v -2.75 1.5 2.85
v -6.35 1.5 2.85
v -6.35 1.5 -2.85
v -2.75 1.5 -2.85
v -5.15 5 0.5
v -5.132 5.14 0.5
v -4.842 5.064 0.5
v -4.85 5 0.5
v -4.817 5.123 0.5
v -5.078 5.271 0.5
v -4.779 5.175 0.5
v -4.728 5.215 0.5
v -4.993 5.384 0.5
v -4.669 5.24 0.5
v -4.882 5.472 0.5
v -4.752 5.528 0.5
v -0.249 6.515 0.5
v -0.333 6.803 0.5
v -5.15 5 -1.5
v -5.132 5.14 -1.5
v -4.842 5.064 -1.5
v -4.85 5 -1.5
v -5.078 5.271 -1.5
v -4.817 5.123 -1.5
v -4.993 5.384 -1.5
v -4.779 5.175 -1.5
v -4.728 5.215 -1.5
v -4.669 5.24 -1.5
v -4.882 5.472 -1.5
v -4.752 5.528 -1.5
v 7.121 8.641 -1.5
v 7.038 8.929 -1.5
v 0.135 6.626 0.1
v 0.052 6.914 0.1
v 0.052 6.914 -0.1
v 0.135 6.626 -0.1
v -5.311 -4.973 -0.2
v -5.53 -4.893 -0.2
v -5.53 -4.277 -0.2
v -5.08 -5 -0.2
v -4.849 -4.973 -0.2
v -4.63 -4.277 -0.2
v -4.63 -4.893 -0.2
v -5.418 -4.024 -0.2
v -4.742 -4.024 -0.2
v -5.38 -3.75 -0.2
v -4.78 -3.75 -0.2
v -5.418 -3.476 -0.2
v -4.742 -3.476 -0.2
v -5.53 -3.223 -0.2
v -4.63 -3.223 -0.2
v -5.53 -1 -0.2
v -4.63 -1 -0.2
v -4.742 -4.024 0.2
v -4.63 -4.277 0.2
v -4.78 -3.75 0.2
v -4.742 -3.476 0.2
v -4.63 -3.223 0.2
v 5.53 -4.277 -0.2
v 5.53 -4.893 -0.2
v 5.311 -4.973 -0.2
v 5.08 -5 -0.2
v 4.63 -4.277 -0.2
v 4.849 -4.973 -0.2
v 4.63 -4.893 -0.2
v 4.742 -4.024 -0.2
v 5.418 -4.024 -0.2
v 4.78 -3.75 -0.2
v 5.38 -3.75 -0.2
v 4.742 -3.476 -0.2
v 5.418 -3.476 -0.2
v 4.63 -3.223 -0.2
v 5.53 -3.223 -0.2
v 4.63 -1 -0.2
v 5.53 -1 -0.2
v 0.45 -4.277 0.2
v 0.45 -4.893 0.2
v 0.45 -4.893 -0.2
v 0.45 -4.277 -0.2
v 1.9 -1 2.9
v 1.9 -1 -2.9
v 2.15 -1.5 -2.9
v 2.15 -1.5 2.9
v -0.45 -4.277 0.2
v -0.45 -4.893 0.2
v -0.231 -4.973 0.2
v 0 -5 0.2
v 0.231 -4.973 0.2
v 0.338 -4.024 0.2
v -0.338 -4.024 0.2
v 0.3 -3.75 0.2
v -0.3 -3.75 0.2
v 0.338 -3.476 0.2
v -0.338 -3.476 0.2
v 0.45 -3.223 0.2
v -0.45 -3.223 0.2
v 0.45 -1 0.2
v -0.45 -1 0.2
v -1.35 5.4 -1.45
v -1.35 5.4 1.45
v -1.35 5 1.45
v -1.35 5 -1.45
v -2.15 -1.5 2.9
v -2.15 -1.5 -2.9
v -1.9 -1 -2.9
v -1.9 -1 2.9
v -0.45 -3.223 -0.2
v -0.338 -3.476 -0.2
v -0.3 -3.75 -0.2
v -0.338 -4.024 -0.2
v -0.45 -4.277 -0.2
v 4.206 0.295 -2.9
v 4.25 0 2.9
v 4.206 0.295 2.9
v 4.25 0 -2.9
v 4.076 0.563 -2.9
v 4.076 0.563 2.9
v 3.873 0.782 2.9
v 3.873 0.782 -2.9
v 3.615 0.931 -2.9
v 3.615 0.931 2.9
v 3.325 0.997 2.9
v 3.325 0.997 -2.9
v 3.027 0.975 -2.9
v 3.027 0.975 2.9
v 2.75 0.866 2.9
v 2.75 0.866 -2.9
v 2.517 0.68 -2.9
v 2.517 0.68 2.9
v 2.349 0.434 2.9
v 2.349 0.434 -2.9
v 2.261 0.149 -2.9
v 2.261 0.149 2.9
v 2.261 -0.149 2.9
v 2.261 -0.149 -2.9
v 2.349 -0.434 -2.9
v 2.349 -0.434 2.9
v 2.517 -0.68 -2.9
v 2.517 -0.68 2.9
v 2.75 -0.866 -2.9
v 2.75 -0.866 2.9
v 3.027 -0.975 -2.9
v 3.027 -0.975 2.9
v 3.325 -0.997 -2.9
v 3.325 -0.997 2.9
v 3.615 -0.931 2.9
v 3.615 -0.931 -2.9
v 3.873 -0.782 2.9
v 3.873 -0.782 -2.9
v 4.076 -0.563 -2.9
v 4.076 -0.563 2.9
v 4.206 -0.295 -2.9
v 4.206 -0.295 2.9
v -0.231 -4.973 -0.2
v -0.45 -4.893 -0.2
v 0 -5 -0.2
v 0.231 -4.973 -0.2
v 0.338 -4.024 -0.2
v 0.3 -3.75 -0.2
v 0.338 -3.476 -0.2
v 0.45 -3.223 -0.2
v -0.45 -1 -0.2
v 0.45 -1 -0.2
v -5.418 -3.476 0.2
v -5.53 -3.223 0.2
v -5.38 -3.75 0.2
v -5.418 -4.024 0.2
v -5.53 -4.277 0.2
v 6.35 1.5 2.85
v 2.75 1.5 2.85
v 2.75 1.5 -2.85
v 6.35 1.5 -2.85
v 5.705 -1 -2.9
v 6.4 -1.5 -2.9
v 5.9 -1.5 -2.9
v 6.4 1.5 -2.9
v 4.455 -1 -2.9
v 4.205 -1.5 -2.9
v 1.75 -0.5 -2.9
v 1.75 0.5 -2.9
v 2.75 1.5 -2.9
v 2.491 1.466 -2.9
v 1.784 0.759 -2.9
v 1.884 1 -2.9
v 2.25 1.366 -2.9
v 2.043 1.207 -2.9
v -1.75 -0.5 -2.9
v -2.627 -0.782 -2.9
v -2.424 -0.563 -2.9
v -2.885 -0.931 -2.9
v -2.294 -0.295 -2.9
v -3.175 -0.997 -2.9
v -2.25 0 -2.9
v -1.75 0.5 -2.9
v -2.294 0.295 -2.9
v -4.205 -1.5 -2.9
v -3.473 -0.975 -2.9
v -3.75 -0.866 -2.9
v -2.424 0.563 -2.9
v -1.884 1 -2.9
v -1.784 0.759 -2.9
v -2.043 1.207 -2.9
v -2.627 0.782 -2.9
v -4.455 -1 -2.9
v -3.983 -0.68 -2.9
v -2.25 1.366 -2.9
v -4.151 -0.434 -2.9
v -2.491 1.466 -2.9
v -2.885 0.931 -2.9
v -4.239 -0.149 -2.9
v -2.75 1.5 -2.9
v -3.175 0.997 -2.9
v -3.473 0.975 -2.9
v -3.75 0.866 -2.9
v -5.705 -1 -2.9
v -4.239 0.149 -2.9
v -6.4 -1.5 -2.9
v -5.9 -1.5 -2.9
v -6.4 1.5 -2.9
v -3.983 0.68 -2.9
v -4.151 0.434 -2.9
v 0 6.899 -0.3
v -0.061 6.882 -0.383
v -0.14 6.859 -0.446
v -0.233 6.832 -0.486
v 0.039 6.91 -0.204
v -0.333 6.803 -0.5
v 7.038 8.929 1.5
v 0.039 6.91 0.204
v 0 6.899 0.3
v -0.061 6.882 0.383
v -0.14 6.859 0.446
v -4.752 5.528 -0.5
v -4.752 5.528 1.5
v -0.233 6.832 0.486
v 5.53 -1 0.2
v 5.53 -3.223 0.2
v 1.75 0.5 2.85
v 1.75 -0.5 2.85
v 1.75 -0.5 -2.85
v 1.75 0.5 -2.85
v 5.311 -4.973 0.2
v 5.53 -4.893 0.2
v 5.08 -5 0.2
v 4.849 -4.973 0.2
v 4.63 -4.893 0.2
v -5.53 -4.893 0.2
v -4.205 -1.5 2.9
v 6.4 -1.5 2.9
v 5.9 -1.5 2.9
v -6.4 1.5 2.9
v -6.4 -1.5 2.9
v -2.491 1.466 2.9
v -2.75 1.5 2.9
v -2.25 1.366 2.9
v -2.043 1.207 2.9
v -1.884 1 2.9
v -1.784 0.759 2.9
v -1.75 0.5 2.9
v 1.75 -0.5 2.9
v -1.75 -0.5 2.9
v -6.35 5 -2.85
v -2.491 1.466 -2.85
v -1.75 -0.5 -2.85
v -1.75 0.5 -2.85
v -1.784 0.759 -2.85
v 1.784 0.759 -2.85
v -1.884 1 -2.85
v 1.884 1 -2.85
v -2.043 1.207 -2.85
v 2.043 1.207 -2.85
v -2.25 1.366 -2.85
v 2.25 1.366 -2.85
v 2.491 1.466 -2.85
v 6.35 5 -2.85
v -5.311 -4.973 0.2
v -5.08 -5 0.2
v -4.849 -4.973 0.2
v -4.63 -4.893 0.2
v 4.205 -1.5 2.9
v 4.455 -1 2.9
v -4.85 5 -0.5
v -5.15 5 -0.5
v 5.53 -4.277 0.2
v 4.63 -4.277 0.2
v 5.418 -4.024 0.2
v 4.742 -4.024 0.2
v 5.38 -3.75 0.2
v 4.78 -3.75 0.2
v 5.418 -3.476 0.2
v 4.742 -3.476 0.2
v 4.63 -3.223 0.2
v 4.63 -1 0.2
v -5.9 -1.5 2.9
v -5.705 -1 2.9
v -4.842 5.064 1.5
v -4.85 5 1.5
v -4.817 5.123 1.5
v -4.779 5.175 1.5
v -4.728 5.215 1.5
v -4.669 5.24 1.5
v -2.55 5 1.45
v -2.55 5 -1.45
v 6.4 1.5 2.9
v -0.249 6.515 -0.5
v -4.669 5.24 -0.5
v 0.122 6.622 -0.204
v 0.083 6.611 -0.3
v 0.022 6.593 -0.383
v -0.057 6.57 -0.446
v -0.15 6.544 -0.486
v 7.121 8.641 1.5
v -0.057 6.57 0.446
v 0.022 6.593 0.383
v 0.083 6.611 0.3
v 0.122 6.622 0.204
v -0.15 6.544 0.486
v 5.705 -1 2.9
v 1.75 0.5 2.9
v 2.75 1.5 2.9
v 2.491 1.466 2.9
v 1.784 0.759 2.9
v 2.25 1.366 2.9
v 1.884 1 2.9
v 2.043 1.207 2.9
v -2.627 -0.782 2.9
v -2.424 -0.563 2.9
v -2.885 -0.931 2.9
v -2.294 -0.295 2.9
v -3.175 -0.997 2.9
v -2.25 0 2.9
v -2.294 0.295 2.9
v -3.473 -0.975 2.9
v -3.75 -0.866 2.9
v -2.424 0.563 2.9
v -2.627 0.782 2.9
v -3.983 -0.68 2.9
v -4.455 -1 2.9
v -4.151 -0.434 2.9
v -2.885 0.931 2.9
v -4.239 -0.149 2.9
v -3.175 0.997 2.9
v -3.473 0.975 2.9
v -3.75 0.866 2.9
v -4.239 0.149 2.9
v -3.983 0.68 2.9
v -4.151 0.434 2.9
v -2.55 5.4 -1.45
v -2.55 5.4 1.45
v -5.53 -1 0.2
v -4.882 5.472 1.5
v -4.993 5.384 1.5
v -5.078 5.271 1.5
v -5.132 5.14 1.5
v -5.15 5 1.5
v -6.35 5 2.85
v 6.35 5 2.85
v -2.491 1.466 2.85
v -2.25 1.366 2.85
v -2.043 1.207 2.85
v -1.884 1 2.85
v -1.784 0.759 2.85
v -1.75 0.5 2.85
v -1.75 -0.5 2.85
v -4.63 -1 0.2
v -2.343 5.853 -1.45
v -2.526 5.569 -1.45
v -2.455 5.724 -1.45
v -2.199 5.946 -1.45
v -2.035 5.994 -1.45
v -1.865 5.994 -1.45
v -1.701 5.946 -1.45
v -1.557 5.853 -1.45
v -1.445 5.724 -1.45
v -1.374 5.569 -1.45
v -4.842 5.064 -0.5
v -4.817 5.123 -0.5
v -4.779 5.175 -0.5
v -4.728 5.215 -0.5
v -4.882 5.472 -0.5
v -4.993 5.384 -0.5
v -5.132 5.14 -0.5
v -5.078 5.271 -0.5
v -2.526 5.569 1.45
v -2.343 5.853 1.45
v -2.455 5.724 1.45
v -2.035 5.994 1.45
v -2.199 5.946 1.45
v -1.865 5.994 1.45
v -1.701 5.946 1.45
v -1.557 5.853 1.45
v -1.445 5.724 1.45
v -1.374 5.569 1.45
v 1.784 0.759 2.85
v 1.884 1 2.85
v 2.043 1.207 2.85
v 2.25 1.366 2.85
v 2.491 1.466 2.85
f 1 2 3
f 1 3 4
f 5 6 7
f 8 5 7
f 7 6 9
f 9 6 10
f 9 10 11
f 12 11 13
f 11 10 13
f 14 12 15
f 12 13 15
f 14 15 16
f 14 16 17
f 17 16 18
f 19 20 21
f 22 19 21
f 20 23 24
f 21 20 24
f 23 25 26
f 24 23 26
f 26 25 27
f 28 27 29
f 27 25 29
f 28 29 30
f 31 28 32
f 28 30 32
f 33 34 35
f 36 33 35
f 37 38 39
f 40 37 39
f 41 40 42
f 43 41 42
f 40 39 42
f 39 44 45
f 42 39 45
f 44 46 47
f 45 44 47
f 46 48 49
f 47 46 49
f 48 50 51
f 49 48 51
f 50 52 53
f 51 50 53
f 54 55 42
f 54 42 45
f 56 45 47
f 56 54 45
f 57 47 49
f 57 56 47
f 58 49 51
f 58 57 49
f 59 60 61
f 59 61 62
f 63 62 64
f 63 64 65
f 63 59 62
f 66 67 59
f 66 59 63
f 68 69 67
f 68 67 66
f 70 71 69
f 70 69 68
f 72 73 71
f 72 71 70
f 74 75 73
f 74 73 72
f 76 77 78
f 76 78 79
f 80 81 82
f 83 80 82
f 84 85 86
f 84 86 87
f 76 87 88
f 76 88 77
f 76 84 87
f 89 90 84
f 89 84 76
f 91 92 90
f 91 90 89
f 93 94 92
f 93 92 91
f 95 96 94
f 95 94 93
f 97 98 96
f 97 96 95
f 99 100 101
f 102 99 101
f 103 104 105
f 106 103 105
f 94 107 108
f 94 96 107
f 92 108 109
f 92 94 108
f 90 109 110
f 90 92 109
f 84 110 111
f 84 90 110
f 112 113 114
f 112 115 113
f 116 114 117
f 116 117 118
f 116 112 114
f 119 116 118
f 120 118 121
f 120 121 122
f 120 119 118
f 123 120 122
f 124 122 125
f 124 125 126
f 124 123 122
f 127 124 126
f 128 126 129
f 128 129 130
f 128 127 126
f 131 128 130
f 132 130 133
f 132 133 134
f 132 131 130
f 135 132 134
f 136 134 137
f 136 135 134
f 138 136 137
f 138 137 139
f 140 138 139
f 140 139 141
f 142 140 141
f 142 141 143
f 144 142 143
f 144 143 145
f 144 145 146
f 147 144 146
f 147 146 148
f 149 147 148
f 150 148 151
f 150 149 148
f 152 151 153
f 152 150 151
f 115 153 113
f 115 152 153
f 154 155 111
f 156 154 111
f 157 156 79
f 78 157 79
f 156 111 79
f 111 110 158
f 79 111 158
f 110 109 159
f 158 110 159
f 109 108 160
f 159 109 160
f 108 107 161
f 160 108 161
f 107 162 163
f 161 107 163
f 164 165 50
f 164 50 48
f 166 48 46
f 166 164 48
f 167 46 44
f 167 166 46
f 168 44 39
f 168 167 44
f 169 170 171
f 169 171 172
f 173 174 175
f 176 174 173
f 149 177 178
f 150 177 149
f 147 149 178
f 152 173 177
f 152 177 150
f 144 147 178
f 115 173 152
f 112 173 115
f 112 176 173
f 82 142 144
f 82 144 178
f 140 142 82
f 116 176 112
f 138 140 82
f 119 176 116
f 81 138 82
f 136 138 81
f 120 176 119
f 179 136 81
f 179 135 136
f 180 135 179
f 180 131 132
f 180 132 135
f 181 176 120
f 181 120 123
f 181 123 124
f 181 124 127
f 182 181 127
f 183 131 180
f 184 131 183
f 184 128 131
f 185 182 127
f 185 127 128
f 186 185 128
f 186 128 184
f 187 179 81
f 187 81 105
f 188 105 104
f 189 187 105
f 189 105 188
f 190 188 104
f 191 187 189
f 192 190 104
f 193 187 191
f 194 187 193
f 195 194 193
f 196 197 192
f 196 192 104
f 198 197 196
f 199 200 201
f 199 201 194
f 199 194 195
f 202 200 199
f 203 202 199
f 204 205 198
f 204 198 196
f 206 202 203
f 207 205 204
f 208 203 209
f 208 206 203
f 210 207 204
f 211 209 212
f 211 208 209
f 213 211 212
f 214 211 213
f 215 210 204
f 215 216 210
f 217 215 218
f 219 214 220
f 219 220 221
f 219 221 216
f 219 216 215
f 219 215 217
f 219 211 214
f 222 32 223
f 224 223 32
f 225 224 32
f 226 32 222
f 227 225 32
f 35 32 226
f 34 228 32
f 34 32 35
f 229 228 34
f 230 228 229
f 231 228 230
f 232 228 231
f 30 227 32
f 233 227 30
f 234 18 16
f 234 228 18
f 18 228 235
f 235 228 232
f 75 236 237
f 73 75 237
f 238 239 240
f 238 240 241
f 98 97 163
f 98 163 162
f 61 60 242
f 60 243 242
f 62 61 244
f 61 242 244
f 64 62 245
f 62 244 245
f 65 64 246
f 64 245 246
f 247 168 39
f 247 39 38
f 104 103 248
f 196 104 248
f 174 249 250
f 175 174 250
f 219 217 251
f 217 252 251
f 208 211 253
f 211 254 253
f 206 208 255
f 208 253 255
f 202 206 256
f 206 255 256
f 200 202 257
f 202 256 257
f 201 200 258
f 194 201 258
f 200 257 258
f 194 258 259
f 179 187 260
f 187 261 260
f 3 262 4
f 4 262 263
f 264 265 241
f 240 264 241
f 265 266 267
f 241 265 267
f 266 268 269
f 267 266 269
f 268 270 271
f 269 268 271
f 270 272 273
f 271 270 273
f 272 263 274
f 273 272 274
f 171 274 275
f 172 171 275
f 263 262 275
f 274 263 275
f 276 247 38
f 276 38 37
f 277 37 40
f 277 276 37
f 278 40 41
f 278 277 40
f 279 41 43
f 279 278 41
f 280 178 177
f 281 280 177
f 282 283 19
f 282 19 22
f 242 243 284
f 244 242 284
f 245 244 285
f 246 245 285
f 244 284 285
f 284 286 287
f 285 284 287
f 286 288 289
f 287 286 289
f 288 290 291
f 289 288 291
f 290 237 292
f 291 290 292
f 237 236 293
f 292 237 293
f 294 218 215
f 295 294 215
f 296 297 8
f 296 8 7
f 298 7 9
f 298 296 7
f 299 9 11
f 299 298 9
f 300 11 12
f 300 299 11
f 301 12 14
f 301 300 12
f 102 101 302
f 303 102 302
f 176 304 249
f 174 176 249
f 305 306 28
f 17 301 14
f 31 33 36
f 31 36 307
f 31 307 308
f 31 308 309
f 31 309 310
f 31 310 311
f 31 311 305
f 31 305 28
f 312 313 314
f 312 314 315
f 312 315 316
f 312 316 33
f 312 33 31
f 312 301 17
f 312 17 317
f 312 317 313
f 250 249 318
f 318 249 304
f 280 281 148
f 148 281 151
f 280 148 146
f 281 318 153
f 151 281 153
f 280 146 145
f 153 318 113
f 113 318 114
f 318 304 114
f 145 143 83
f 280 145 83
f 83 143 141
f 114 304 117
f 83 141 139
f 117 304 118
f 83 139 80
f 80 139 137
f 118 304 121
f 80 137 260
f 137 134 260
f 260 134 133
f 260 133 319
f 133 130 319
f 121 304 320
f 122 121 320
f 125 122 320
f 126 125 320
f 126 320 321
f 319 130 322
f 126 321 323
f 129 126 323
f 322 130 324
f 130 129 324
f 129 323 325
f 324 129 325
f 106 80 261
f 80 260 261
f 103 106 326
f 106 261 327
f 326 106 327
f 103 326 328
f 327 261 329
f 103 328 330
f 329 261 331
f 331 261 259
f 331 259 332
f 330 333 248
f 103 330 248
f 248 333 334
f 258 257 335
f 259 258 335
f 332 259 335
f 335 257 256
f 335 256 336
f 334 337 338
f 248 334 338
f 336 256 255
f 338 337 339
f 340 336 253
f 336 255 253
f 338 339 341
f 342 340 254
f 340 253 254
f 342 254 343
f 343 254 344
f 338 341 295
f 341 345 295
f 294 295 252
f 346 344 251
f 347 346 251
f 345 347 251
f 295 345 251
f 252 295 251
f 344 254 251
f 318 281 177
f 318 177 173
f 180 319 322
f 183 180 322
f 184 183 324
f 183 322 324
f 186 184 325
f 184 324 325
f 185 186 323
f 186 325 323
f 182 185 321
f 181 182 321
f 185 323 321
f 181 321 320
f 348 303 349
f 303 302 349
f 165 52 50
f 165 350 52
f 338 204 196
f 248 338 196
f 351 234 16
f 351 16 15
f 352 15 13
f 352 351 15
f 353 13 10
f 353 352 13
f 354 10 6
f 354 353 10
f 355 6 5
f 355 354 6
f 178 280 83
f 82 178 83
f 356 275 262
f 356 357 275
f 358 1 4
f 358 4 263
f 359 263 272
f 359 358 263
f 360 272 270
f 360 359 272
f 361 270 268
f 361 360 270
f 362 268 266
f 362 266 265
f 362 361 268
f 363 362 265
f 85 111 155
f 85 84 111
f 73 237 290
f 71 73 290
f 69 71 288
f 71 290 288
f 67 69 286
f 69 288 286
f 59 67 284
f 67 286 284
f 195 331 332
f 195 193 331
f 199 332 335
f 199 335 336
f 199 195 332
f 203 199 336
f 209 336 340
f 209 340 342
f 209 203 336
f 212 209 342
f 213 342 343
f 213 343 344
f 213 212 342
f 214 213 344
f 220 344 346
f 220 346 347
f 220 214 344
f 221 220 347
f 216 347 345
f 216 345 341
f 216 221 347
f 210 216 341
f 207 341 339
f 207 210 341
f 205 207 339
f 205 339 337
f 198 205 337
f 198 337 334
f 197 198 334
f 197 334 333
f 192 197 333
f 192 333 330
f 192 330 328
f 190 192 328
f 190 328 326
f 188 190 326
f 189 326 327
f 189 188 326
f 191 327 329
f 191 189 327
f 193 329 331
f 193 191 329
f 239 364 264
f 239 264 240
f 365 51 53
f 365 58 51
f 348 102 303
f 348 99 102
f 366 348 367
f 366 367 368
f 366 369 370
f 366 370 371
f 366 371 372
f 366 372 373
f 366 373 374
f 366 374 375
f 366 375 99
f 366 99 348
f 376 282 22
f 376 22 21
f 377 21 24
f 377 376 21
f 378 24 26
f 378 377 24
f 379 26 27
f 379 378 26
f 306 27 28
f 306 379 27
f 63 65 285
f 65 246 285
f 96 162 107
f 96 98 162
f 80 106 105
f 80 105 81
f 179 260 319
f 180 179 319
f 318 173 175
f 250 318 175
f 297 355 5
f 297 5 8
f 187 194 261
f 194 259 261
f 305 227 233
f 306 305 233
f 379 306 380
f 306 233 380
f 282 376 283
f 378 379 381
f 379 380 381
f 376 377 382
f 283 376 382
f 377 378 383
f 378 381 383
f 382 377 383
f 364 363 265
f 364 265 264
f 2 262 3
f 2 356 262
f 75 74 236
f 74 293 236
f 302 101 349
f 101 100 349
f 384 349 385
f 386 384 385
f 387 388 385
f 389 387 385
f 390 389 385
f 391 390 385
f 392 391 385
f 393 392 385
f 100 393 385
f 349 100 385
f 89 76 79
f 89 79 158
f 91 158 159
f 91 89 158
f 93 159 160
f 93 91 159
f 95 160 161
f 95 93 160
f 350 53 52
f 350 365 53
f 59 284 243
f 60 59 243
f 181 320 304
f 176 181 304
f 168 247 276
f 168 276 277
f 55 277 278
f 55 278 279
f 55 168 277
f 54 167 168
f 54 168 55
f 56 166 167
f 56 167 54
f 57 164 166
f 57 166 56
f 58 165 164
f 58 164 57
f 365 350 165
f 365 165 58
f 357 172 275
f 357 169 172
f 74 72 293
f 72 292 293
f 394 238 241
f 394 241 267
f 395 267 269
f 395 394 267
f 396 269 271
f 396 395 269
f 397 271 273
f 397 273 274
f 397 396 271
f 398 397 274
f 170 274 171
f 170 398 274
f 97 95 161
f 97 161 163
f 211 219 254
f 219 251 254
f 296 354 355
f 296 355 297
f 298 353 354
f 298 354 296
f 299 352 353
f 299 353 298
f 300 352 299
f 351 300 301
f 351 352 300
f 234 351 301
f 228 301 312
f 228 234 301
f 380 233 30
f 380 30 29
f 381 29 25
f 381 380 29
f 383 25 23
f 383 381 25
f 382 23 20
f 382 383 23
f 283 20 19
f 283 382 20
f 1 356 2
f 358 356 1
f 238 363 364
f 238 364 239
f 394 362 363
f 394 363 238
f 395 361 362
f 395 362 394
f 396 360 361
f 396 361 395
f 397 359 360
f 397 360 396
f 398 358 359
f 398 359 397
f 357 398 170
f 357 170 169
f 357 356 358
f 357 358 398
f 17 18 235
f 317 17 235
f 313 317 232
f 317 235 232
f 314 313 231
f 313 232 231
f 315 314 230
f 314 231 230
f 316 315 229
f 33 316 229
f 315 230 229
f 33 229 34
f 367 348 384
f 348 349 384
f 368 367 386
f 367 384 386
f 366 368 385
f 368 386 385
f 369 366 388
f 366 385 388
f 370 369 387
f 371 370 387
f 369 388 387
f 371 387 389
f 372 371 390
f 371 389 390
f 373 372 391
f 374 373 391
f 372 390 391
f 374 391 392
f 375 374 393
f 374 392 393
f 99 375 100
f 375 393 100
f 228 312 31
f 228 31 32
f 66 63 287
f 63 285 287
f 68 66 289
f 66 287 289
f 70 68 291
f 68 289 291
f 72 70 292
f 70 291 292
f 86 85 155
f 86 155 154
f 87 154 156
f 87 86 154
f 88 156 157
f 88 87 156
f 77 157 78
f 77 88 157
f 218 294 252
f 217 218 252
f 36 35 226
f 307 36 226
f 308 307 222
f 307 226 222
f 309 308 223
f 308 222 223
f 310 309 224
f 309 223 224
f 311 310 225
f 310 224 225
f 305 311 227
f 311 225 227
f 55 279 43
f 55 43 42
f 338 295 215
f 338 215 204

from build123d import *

# Parameters (mm, degrees)
SKETCH1_R             = 1
BOSS_EXTRUDE1_DEPTH   = 2.9
BOSS_EXTRUDE2_START   = -2.9
BOSS_EXTRUDE2_DEPTH   = 2.85
CUT_EXTRUDE1_DEPTH    = 10.97997996
BOSS_EXTRUDE3_DEPTH   = 0.2
BOSS_EXTRUDE3_2_DEPTH = 0.2
BOSS_EXTRUDE3_3_DEPTH = 0.2
BOSS_EXTRUDE4_START   = -2.85
BOSS_EXTRUDE4_DEPTH   = 1.45
BOSS_EXTRUDE5_START   = -2.85
BOSS_EXTRUDE5_DEPTH   = 1.5
CUT_EXTRUDE2_DEPTH    = 15.762153366


with BuildPart() as part:
    # Sketch1 → Boss-Extrude1 (new, symmetric)
    with BuildSketch(Plane.XY):
        with BuildLine():
            Line((6.4, -1.5), (-6.4, -1.5))
            Line((-6.4, -1.5), (-6.4, 1.5))
            Line((-6.4, 1.5), (-2.75, 1.5))
            ThreePointArc((-2.75, 1.5), (-2.042893219, 1.207106781), (-1.75, 0.5))
            Line((-1.75, 0.5), (-1.75, -0.5))
            Line((-1.75, -0.5), (1.75, -0.5))
            Line((1.75, -0.5), (1.75, 0.5))
            ThreePointArc((1.75, 0.5), (2.042893219, 1.207106781), (2.75, 1.5))
            Line((2.75, 1.5), (6.4, 1.5))
            Line((6.4, 1.5), (6.4, -1.5))
        make_face()
        with Locations((-3.25, 0)):
            Circle(SKETCH1_R, mode=Mode.SUBTRACT)
        with Locations((3.25, 0)):
            Circle(SKETCH1_R, mode=Mode.SUBTRACT)
    extrude(amount=BOSS_EXTRUDE1_DEPTH, both=True)

    # Sketch4 → Cut-Extrude1 (cut, through all)
    with BuildSketch(Plane.XY.offset(2.9)):
        Polygon((-5.9, -1.5), (-5.705, -1), (-4.455, -1), (-4.205, -1.5), align=None)
        Polygon((-2.15, -1.5), (-1.9, -1), (1.9, -1), (2.15, -1.5), align=None)
        Polygon((5.9, -1.5), (4.205, -1.5), (4.455, -1), (5.705, -1), align=None)
    extrude(amount=-CUT_EXTRUDE1_DEPTH, mode=Mode.SUBTRACT)


with BuildPart() as body_2:
    # Sketch3 → Boss-Extrude2 (new, symmetric)
    with BuildSketch(Plane.XY.offset(2.9).offset(BOSS_EXTRUDE2_START)):
        with BuildLine():
            Line((-3.25, 5), (-6.35, 5))
            Line((-6.35, 5), (-6.35, 1.5))
            Line((-6.35, 1.5), (-2.75, 1.5))
            ThreePointArc((-2.75, 1.5), (-2.042893219, 1.207106781), (-1.75, 0.5))
            Line((-1.75, 0.5), (-1.75, -0.5))
            Line((-1.75, -0.5), (1.75, -0.5))
            Line((1.75, -0.5), (1.75, 0.5))
            ThreePointArc((1.75, 0.5), (2.042893219, 1.207106781), (2.75, 1.5))
            Line((2.75, 1.5), (6.35, 1.5))
            Line((6.35, 1.5), (6.35, 5))
            Line((6.35, 5), (3.25, 5))
            Line((3.25, 5), (-3.25, 5))
        make_face()
    extrude(amount=BOSS_EXTRUDE2_DEPTH, both=True)


with BuildPart() as body_3:
    # Sketch5 → Boss-Extrude3 (new, symmetric)
    with BuildSketch(Plane.XY):
        with BuildLine():
            Line((-5.53, -1), (-5.53, -3.223217312))
            ThreePointArc((-5.53, -3.223217312), (-5.38, -3.75), (-5.53, -4.276782688))
            Line((-5.53, -4.276782688), (-5.53, -4.893028555))
            ThreePointArc((-5.53, -4.893028555), (-5.08, -5), (-4.63, -4.893028555))
            Line((-4.63, -4.893028555), (-4.63, -4.276782688))
            ThreePointArc((-4.63, -4.276782688), (-4.78, -3.75), (-4.63, -3.223217312))
            Line((-4.63, -3.223217312), (-4.63, -1))
            Line((-4.63, -1), (-5.08, -1))
            Line((-5.08, -1), (-5.53, -1))
        make_face()
    extrude(amount=BOSS_EXTRUDE3_DEPTH, both=True)


with BuildPart() as body_4:
    # Sketch5 → Boss-Extrude3 2 (new, symmetric)
    with BuildSketch(Plane.XY):
        with BuildLine():
            Line((-0.45, -4.276782688), (-0.45, -4.893028555))
            ThreePointArc((-0.45, -4.893028555), (0, -5), (0.45, -4.893028555))
            Line((0.45, -4.893028555), (0.45, -4.276782688))
            ThreePointArc((0.45, -4.276782688), (0.3, -3.75), (0.45, -3.223217312))
            Line((0.45, -3.223217312), (0.45, -1))
            Line((0.45, -1), (0, -1))
            Line((0, -1), (-0.45, -1))
            Line((-0.45, -1), (-0.45, -3.223217312))
            ThreePointArc((-0.45, -3.223217312), (-0.3, -3.75), (-0.45, -4.276782688))
        make_face()
    extrude(amount=BOSS_EXTRUDE3_2_DEPTH, both=True)


with BuildPart() as body_5:
    # Sketch5 → Boss-Extrude3 3 (new, symmetric)
    with BuildSketch(Plane.XY):
        with BuildLine():
            Line((5.53, -4.276782688), (5.53, -4.893028555))
            ThreePointArc((5.53, -4.893028555), (5.08, -5), (4.63, -4.893028555))
            Line((4.63, -4.893028555), (4.63, -4.276782688))
            ThreePointArc((4.63, -4.276782688), (4.78, -3.75), (4.63, -3.223217312))
            Line((4.63, -3.223217312), (4.63, -1))
            Line((4.63, -1), (5.08, -1))
            Line((5.08, -1), (5.53, -1))
            Line((5.53, -1), (5.53, -3.223217312))
            ThreePointArc((5.53, -3.223217312), (5.38, -3.75), (5.53, -4.276782688))
        make_face()
    extrude(amount=BOSS_EXTRUDE3_3_DEPTH, both=True)


with BuildPart() as body_6:
    # Sketch6 → Boss-Extrude4 (new, symmetric)
    with BuildSketch(Plane.XY.offset(2.85).offset(BOSS_EXTRUDE4_START)):
        with BuildLine():
            Line((-1.35, 5), (-2.55, 5))
            Line((-2.55, 5), (-2.55, 5.4))
            ThreePointArc((-2.55, 5.4), (-1.95, 6), (-1.35, 5.4))
            Line((-1.35, 5.4), (-1.35, 5))
        make_face()
    extrude(amount=BOSS_EXTRUDE4_DEPTH, both=True)


with BuildPart() as body_7:
    # Sketch7 → Boss-Extrude5 (new, symmetric)
    with BuildSketch(Plane.XY.offset(2.85).offset(BOSS_EXTRUDE5_START)):
        with BuildLine():
            Line((-4.669276938, 5.240209712), (7.121336657, 8.640645089))
            Line((7.121336657, 8.640645089), (7.038204331, 8.928896743))
            Line((7.038204331, 8.928896743), (-4.752409263, 5.528461367))
            ThreePointArc((-4.752409263, 5.528461367), (-5.039502614, 5.330662143), (-5.15, 5))
            Line((-5.15, 5), (-4.85, 5))
            ThreePointArc((-4.85, 5), (-4.799773915, 5.150300974), (-4.669276938, 5.240209712))
        make_face()
    extrude(amount=BOSS_EXTRUDE5_DEPTH, both=True)

    # Sketch8 → Cut-Extrude2 (cut, through all)
    with BuildSketch(Plane(origin=(-1.836916771, 6.369294945, 0), x_dir=(0.9608388493523414, 0.27710775083939576, 0), z_dir=(-0.2771077508393957, 0.9608388493523413, 0))):
        with BuildLine():
            Line((1.565680047, 0.5), (-3.034319953, 0.5))
            Line((-3.034319953, 0.5), (-4.534319953, 0.5))
            Line((-4.534319953, 0.5), (-4.534319953, -0.5))
            Line((-4.534319953, -0.5), (-3.034319953, -0.5))
            Line((-3.034319953, -0.5), (1.565680047, -0.5))
            ThreePointArc((1.565680047, -0.5), (1.84852276, -0.382842712), (1.965680047, -0.1))
            Line((1.965680047, -0.1), (1.965680047, 0))
            Line((1.965680047, 0), (1.965680047, 0.1))
            ThreePointArc((1.965680047, 0.1), (1.84852276, 0.382842712), (1.565680047, 0.5))
        make_face()
    extrude(amount=-CUT_EXTRUDE2_DEPTH, mode=Mode.SUBTRACT)


solid = Compound([part.part, body_2.part, body_3.part, body_4.part, body_5.part, body_6.part, body_7.part])
